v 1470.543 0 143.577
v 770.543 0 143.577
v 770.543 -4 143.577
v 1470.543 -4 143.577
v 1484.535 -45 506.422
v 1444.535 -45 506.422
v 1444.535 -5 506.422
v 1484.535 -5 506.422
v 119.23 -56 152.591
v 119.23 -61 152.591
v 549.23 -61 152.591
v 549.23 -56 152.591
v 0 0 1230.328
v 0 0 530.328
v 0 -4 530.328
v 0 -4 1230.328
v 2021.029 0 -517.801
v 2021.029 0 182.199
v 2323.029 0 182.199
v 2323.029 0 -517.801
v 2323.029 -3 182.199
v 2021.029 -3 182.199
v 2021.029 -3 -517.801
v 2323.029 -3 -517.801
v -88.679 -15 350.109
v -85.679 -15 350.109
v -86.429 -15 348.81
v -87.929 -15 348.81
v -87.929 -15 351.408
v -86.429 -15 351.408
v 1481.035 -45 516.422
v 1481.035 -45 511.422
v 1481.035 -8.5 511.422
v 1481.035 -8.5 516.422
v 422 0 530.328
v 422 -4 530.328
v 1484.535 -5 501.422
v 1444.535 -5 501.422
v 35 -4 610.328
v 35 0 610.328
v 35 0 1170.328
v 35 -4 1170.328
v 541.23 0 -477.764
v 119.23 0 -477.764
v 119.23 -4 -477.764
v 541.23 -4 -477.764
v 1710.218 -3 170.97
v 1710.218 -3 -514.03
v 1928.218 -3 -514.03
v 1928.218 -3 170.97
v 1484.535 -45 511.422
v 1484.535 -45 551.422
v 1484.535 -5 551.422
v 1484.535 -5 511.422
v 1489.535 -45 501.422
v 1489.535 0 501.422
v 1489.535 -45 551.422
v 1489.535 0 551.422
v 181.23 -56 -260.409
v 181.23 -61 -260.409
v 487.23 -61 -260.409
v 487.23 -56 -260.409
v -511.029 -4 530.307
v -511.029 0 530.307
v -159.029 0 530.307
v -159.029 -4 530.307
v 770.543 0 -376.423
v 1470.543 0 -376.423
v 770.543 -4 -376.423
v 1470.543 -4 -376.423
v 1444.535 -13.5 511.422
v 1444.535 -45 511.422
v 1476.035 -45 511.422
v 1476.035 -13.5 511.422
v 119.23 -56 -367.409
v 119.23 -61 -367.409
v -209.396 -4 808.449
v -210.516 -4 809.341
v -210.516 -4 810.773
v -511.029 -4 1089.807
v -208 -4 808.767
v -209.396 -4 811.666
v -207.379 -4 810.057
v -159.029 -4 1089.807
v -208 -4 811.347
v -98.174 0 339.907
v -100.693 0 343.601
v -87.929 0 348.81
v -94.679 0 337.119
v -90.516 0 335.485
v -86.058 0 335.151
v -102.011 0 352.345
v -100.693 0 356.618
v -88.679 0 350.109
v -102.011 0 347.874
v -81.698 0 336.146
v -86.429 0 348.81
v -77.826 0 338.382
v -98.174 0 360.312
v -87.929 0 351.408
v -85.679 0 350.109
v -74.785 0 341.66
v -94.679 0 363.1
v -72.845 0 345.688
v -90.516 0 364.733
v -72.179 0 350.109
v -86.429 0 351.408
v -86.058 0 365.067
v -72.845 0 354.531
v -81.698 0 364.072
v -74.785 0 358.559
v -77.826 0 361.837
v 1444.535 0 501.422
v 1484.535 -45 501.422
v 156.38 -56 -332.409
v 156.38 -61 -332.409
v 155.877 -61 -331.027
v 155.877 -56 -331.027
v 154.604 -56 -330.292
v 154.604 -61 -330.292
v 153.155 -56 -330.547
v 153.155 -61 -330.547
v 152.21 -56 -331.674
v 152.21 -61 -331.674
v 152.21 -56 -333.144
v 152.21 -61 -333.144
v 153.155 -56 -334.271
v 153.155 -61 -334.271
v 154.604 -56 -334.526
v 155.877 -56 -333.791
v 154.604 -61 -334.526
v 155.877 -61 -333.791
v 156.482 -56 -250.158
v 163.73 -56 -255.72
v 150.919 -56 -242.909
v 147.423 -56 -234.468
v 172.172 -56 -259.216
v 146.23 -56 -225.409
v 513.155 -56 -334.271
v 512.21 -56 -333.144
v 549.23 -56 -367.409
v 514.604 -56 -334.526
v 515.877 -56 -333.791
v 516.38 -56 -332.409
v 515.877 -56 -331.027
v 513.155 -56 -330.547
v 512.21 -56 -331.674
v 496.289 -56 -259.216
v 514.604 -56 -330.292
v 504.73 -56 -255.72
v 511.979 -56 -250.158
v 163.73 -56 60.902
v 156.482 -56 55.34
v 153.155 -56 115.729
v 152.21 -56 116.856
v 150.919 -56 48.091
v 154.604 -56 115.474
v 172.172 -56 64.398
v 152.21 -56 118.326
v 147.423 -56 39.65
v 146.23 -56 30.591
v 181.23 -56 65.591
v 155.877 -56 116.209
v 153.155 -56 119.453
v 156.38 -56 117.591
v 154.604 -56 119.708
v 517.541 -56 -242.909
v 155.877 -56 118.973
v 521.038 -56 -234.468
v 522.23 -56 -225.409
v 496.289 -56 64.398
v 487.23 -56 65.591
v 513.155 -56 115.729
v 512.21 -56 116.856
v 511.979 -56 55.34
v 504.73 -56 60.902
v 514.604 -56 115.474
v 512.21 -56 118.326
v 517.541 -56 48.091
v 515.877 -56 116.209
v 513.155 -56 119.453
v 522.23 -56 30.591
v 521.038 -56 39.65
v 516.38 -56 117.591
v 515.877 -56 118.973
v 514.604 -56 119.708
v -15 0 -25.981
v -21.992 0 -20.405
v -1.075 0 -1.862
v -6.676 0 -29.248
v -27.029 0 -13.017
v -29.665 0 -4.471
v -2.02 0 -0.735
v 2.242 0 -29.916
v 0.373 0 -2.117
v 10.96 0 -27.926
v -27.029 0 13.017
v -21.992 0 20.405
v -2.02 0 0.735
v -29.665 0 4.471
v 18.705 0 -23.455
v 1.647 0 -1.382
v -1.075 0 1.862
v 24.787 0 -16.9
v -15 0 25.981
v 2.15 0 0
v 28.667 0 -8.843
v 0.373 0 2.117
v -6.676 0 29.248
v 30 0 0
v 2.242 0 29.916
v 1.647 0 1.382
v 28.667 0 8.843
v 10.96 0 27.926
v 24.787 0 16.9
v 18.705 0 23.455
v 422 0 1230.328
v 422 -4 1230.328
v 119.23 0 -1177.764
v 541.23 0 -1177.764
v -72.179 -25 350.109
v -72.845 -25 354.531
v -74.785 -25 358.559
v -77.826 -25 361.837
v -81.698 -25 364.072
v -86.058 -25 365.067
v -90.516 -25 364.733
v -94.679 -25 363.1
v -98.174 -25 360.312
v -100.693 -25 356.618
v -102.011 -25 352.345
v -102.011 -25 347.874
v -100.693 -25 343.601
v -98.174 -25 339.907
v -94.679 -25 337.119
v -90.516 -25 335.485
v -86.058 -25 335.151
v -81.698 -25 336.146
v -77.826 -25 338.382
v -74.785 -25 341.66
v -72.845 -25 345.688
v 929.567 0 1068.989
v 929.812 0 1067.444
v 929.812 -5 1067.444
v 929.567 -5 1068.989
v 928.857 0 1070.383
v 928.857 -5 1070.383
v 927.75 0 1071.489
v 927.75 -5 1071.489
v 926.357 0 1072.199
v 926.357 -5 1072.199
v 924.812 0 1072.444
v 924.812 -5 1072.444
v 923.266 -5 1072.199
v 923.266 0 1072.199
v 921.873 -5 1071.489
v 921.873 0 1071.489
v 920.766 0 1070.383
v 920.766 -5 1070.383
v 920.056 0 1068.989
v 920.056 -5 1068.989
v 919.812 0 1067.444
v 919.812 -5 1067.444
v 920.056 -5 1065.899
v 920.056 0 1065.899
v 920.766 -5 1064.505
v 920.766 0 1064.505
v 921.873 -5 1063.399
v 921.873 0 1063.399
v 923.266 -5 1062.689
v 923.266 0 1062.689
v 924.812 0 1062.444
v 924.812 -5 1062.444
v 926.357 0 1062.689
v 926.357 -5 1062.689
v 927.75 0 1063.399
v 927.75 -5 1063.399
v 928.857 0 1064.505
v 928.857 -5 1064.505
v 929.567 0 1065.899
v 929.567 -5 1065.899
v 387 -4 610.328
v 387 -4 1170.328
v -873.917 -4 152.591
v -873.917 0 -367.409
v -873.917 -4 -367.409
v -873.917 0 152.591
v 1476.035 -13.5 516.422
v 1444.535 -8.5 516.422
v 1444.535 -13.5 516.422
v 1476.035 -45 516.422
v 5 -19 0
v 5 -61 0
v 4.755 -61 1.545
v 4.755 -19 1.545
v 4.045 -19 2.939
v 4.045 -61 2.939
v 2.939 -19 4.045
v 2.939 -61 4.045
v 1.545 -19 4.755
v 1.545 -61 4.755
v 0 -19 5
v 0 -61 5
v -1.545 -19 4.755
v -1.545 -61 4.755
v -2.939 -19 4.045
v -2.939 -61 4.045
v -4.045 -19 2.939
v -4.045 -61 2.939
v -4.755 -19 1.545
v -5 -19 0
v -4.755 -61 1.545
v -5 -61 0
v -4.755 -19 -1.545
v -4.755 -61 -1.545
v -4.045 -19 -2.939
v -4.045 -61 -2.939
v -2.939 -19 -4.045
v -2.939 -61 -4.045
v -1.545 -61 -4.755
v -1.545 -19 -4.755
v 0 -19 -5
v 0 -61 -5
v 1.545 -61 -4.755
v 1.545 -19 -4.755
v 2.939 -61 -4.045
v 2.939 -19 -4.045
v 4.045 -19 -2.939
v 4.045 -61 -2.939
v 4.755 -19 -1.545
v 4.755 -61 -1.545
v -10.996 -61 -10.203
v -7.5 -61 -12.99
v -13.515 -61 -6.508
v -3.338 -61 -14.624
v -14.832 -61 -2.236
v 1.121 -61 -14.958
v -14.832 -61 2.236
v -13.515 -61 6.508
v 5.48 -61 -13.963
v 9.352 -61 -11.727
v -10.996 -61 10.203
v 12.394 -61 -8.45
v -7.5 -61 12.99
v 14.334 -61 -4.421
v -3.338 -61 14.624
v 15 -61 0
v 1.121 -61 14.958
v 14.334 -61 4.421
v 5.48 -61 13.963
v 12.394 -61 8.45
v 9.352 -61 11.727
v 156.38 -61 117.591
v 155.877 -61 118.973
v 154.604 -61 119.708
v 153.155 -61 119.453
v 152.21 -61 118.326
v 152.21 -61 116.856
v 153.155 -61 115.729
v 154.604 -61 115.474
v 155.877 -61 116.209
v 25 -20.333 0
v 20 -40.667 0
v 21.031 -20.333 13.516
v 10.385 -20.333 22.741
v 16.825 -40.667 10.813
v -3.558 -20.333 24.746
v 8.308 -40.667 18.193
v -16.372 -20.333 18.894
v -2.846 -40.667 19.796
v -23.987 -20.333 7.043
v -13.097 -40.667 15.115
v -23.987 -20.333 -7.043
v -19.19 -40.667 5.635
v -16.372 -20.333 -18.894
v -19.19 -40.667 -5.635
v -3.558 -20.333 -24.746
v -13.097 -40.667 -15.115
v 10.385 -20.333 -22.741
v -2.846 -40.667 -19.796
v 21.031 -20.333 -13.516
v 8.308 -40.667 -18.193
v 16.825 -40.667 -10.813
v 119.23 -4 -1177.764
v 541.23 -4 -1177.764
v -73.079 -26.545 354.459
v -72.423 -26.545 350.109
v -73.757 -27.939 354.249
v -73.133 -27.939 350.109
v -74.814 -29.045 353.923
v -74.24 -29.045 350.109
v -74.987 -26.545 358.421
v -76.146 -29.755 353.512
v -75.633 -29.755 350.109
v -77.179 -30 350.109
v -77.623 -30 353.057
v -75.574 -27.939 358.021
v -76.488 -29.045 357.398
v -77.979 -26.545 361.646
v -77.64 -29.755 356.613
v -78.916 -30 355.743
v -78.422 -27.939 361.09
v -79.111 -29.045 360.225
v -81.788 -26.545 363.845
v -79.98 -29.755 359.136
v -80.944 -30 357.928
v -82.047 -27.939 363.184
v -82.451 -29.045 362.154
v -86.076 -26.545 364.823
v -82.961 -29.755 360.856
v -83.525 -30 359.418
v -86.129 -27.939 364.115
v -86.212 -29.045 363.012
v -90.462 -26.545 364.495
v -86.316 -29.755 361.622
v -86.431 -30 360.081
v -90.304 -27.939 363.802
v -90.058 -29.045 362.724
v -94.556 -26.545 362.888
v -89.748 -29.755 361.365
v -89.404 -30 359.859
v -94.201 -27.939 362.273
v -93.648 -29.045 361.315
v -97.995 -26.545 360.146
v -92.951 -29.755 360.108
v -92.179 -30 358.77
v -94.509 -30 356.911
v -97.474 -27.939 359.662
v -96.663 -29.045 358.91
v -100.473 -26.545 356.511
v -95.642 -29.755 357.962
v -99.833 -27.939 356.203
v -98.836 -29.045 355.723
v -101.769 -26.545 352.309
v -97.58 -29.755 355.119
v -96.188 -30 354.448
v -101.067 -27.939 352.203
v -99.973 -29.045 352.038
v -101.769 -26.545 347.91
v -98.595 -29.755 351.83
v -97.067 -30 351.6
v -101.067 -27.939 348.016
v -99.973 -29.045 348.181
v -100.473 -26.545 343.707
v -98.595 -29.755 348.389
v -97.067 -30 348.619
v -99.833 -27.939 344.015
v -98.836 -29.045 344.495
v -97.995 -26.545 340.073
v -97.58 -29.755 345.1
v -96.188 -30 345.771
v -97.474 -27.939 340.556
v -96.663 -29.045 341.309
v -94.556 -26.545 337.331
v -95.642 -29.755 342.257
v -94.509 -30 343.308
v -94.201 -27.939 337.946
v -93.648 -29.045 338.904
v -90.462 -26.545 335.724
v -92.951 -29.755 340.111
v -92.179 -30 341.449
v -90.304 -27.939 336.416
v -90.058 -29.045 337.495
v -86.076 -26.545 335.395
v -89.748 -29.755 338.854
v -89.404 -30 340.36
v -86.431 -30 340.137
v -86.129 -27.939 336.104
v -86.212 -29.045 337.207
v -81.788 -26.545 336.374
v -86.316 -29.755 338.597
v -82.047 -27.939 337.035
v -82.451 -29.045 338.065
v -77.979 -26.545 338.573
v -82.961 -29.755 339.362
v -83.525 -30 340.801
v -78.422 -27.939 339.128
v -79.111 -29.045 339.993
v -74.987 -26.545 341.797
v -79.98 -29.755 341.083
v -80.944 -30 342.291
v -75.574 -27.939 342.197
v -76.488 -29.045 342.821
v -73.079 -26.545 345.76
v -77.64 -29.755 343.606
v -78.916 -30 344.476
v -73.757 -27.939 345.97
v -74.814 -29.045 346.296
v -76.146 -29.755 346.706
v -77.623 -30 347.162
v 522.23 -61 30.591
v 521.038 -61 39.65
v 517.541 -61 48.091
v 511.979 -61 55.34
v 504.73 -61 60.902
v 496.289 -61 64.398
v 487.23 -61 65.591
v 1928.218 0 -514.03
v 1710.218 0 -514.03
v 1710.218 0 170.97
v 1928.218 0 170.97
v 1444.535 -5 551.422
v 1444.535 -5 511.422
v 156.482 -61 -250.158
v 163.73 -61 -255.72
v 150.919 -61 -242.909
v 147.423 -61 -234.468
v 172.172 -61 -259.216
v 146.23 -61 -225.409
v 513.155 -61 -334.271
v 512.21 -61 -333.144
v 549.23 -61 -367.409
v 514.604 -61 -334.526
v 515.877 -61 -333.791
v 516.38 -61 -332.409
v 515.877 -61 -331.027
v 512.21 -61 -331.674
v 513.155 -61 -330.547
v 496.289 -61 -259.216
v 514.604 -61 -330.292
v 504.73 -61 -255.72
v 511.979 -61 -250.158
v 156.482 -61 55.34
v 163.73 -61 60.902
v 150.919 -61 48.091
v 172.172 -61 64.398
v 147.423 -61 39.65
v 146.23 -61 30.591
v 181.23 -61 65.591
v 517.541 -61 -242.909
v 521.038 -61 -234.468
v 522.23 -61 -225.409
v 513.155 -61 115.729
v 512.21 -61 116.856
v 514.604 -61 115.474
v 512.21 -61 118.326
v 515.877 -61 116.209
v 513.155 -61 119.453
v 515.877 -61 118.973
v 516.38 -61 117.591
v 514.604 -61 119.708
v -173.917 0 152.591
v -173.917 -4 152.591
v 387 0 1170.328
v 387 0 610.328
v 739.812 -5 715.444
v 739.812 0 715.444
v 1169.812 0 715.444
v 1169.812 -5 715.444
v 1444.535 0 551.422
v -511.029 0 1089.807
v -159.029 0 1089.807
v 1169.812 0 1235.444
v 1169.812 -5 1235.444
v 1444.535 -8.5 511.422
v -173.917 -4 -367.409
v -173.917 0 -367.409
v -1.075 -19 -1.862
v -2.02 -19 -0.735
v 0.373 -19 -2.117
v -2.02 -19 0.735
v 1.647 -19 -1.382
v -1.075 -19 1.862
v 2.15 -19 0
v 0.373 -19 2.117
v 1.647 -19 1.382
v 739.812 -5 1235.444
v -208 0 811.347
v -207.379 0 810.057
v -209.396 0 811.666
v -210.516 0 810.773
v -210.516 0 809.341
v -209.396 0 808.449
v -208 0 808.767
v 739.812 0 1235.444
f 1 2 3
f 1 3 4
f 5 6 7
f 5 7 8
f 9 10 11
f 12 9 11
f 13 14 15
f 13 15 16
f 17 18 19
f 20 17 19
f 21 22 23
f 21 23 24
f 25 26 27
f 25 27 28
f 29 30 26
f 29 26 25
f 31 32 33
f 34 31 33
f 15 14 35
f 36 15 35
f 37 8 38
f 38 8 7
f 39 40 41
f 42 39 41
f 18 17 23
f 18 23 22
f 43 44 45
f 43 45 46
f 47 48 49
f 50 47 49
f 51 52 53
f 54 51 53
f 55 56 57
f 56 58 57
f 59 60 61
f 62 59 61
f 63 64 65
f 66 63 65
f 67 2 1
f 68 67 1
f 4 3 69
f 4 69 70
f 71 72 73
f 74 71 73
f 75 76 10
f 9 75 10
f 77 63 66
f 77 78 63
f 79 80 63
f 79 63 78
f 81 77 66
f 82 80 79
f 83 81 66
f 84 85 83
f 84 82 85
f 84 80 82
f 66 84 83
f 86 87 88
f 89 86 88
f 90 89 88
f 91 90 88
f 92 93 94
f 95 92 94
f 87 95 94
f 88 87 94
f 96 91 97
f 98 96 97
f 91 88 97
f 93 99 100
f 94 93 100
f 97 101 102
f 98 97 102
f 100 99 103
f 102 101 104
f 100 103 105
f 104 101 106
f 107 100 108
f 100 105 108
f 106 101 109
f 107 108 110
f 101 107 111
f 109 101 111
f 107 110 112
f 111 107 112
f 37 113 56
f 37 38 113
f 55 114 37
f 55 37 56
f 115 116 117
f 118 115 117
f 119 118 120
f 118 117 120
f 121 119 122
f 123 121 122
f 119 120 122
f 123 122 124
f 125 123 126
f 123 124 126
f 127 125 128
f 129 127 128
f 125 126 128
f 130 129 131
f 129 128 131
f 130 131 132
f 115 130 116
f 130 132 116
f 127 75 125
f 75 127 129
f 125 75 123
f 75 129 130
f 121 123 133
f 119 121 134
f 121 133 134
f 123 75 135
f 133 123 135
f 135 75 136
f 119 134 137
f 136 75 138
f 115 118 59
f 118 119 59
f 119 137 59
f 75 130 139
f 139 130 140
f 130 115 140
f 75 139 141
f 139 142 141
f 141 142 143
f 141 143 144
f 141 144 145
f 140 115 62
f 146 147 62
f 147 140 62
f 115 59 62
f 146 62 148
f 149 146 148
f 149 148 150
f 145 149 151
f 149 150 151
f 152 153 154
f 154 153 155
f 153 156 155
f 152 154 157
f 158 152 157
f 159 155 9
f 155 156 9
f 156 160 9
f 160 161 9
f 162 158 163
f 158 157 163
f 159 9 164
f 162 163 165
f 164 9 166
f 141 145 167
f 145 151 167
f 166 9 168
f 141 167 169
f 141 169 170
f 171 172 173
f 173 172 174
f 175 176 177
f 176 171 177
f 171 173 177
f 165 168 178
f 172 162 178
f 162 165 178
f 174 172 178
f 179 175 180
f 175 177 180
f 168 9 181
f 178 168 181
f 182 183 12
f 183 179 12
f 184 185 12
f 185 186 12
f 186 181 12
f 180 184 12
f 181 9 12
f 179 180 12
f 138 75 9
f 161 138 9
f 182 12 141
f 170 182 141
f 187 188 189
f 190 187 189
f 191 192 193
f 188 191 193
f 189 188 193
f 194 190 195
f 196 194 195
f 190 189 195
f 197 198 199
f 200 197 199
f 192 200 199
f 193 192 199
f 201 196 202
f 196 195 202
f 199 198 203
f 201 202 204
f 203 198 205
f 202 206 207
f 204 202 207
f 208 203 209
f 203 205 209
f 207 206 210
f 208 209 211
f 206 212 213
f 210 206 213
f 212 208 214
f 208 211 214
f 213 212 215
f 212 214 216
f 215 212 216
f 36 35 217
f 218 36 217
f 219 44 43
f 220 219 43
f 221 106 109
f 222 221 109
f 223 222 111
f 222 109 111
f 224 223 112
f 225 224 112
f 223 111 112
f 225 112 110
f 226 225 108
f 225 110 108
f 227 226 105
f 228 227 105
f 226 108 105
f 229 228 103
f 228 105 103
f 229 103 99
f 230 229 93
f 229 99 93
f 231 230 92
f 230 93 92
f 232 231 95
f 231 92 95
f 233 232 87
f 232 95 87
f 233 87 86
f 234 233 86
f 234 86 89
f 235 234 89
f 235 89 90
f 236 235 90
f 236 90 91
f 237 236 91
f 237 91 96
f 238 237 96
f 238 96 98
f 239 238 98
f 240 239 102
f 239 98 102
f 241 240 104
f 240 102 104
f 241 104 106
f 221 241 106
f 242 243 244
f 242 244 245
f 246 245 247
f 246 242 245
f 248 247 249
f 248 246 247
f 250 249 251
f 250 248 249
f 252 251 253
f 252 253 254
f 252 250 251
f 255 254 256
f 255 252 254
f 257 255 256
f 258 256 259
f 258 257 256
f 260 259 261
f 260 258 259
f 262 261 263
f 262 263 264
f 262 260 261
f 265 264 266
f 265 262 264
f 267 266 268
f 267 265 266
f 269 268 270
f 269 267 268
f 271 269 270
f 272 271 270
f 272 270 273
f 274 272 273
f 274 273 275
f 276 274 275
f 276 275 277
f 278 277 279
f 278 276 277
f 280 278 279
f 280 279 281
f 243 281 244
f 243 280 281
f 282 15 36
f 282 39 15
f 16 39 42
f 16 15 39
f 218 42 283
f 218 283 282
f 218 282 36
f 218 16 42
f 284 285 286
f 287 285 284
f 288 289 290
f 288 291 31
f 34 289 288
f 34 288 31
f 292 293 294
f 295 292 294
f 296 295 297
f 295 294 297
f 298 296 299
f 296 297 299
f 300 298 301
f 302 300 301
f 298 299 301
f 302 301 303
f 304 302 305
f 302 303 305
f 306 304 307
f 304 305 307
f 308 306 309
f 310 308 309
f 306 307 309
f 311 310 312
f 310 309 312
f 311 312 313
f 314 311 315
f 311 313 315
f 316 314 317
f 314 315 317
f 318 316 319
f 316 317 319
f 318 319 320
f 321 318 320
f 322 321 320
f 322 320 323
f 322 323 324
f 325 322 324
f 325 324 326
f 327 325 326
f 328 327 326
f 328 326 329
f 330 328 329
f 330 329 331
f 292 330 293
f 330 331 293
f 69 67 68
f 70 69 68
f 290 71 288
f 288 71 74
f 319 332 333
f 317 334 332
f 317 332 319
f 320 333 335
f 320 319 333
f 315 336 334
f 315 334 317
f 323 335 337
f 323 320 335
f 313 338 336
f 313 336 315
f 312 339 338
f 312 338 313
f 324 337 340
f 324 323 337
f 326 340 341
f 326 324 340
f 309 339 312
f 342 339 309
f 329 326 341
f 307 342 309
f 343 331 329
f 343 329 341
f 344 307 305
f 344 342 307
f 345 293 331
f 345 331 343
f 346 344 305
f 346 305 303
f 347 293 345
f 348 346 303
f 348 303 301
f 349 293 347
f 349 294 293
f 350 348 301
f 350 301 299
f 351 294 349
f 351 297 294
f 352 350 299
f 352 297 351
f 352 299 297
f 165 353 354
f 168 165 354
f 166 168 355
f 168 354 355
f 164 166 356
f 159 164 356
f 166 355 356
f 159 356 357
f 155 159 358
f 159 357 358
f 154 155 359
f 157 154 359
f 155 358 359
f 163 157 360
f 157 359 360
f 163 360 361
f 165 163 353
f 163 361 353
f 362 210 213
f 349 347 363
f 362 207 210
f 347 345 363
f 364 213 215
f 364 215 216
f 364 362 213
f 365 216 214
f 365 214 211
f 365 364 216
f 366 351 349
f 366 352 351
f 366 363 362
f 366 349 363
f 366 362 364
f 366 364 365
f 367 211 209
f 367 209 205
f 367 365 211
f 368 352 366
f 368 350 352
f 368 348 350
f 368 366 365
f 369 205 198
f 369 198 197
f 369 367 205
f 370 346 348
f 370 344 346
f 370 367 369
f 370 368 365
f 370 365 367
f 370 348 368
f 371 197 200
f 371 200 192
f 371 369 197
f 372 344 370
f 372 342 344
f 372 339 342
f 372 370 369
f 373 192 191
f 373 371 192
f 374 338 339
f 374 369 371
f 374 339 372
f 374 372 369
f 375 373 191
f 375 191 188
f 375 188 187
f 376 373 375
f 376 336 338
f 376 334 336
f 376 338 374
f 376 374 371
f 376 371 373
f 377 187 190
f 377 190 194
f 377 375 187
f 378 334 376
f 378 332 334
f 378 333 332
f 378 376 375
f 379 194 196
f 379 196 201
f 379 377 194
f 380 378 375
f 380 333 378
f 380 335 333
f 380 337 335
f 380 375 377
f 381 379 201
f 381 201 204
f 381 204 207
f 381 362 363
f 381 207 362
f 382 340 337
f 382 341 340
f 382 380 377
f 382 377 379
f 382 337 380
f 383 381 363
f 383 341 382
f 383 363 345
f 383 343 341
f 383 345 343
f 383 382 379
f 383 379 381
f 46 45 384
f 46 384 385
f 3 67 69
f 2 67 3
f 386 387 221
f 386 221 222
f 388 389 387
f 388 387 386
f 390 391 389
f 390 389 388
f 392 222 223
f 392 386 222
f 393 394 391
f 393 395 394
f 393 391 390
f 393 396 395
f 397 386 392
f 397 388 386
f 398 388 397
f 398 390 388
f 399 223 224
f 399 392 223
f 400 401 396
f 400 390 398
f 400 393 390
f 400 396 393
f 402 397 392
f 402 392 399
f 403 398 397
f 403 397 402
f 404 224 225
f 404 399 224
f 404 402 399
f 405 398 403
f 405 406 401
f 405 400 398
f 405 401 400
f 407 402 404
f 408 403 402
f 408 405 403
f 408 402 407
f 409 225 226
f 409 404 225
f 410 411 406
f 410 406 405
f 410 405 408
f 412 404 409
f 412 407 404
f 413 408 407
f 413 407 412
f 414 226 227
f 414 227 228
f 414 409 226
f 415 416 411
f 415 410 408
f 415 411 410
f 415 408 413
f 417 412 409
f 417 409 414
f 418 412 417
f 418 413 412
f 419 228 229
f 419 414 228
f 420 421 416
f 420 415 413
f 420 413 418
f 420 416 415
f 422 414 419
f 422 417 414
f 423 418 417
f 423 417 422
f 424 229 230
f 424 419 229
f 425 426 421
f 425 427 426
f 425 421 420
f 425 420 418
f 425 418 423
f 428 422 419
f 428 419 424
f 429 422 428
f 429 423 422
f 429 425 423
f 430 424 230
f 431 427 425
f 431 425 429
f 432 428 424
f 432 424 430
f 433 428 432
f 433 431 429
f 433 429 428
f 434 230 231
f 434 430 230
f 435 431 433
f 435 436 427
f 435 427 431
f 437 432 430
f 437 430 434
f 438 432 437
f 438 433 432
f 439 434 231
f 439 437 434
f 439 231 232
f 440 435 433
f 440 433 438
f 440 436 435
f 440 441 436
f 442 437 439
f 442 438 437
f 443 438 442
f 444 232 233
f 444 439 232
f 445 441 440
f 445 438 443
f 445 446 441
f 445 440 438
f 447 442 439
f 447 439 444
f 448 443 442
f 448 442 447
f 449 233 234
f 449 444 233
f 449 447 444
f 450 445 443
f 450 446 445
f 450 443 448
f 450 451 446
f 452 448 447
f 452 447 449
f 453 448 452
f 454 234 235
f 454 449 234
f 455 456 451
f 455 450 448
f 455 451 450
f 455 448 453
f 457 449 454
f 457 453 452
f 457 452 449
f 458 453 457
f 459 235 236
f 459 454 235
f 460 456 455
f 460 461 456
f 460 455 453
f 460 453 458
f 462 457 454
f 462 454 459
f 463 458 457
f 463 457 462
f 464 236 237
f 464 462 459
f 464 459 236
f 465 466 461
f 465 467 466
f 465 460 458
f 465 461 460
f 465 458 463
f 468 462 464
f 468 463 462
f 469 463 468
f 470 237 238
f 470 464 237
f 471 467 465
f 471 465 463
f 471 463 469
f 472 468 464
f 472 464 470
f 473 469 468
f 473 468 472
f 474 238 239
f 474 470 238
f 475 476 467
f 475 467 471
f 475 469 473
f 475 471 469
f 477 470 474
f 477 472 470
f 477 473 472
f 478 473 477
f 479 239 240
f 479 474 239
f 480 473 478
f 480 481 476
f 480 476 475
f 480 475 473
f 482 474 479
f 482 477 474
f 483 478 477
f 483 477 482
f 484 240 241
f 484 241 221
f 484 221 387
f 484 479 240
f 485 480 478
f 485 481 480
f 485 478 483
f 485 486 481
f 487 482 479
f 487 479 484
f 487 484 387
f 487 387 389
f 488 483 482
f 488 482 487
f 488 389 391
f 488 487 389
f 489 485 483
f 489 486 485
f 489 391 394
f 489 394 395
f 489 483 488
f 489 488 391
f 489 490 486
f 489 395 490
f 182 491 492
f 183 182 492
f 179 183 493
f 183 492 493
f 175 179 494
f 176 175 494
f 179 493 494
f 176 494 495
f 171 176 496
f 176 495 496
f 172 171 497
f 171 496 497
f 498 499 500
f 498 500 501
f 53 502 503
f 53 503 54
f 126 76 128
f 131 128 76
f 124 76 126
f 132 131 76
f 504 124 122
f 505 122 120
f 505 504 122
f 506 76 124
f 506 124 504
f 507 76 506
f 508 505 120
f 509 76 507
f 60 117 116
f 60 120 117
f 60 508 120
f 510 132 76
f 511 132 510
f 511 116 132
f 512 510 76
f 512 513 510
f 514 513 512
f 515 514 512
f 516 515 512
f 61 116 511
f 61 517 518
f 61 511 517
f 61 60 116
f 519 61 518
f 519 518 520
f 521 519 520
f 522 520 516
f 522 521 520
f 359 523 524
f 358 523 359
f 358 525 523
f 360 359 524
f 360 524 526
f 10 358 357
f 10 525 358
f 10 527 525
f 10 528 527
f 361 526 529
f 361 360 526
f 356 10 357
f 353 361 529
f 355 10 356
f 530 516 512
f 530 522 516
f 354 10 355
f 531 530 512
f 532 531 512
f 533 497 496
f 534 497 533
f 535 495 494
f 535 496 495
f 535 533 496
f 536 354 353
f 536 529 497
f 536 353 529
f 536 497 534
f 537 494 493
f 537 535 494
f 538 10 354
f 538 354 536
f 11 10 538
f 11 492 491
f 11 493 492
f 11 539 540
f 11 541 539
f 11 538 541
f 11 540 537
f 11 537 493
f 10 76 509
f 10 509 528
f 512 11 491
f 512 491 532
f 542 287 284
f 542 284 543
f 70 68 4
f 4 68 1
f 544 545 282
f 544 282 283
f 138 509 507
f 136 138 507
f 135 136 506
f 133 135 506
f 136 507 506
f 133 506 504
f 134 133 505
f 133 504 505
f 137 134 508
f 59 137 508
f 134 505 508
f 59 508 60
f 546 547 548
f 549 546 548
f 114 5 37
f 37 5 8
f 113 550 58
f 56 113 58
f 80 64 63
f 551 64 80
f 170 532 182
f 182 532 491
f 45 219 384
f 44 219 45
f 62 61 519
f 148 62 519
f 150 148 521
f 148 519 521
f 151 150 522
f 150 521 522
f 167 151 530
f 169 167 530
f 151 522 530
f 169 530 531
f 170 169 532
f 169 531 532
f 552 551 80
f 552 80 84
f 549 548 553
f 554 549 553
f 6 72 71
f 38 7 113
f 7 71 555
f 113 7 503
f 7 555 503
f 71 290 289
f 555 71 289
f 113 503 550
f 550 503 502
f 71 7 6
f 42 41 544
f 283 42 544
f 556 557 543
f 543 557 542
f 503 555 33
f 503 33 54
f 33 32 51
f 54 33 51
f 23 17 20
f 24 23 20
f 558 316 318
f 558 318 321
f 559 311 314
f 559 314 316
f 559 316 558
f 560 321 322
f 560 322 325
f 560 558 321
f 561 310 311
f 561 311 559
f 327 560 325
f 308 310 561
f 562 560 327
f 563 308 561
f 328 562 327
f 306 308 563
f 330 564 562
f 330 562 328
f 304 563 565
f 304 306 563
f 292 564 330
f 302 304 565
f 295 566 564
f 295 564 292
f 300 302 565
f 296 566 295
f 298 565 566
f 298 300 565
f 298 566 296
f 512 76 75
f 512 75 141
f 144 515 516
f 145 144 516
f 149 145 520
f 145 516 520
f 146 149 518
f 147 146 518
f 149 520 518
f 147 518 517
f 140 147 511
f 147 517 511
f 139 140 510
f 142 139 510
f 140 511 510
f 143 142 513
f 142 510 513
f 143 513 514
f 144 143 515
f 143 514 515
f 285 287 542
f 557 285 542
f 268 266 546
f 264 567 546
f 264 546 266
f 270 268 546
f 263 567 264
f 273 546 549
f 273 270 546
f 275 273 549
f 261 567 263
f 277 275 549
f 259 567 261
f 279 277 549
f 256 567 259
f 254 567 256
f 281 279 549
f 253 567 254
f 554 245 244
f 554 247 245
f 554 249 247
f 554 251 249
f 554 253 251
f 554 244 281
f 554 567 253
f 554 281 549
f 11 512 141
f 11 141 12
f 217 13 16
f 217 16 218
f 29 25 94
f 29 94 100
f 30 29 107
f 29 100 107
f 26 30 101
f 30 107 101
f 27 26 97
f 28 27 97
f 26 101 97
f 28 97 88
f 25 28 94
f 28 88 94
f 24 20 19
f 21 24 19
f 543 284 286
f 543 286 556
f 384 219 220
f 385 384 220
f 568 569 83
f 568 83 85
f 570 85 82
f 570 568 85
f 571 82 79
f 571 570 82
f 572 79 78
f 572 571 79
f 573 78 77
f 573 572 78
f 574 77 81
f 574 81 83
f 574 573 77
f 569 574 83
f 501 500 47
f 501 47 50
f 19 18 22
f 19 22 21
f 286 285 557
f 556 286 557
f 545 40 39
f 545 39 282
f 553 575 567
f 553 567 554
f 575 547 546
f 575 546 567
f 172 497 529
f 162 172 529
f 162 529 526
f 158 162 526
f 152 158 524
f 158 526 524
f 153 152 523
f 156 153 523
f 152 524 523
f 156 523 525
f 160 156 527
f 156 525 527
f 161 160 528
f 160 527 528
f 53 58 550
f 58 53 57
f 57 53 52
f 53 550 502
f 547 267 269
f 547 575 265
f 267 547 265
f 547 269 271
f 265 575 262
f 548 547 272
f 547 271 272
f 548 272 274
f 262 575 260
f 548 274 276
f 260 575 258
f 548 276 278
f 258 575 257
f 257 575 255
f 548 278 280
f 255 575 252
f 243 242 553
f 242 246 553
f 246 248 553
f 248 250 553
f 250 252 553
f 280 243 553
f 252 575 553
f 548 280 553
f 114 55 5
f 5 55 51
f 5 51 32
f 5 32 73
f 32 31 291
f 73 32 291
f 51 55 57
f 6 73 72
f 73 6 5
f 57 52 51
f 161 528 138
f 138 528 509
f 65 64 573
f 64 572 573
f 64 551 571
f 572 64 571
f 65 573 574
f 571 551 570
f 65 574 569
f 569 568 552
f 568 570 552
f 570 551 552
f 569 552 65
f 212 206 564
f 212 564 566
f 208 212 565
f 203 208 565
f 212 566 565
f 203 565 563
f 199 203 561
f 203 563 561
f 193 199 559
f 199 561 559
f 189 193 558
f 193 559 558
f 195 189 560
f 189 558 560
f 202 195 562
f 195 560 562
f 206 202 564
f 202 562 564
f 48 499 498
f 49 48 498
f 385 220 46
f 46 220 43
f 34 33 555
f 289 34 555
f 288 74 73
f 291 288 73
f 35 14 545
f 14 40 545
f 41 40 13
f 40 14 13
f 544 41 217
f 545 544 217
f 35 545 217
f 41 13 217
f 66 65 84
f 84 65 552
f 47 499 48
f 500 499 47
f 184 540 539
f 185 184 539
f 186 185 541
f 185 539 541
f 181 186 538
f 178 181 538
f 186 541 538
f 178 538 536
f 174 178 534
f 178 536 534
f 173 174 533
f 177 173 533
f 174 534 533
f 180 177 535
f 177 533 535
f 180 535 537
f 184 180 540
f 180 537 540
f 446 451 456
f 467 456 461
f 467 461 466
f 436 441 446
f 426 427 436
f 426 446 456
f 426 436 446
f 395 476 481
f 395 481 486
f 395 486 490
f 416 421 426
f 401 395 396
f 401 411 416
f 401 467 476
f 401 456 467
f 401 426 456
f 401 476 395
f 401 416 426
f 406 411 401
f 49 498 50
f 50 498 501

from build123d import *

# Parameters (mm, degrees)
F2_R        = 30
F4_R        = 15
F6_R        = 5
F7_DEPTH    = 42
F8_R        = 2.15
F9_DEPTH    = 19.0010001
F10_W       = 430
F10_H       = 520
F10_R       = 2.15
F11_DEPTH   = 5
F13_DEPTH   = 61.0010001
F14_W       = 700
F14_H       = 520
F16_DEPTH   = 4
F15_W       = 422
F15_H       = 700
F17_DEPTH   = 4
F18_W       = 700
F18_H       = 520
F19_DEPTH   = 4
F20_W       = 422
F20_H       = 700
F20_W_2     = 352
F20_H_2     = 560
F21_DEPTH   = 4
F22_W       = 430
F22_H       = 520
F22_R       = 5
F23_DEPTH   = 5
F24_W       = 352
F24_H       = 559.5
F24_R       = 1.65
F25_DEPTH   = 4
F26_R       = 15
F27_DEPTH   = 30
F28_R       = 5
F29_R       = 1.5
F30_DEPTH   = 15
F31_W       = 40
F31_H       = 40
F32_DEPTH   = 5
F33_W       = 40
F33_H       = 40
F33_W_2     = 5
F34_DEPTH   = 5
F35_W       = 40
F35_H       = 40
F36_DEPTH   = 5
F36_FACE1_W = 40
F36_FACE1_H = 40
F38_DEPTH   = 5
F40_DEPTH   = 5
F41_W       = 302
F41_H       = 700
F42_DEPTH   = 3
F43_W       = 218
F43_H       = 685
F44_DEPTH   = 3


with BuildPart() as f5:
    # F2 (on Front) → F5 section 0
    with BuildSketch(Plane.XZ):
        Circle(F2_R)
    # F4 (on offset) → F5 section 1
    with BuildSketch(Plane.XZ.offset(61)):
        Circle(F4_R)
    loft()

    # F6 (on face) → F7 (cut)
    with BuildSketch(Plane.XZ.offset(61)):
        Circle(F6_R)
    extrude(amount=-F7_DEPTH, mode=Mode.SUBTRACT)

    # F8 (on face) → F9 (cut, through all)
    with BuildSketch(Plane.XZ.offset(19)):
        Circle(F8_R)
    extrude(amount=-F9_DEPTH, mode=Mode.SUBTRACT)


with BuildPart() as f11:
    # F10 (on offset) → F11 (new body)
    with BuildSketch(Plane.XZ.offset(61)):
        with Locations((334.2302817106, -107.4090420464)):
            Rectangle(F10_W, F10_H)
        with Locations((154.2302817106, -332.4090420464)):
            Circle(F10_R, mode=Mode.SUBTRACT)
        with Locations((514.2302817106, -332.4090420464)):
            Circle(F10_R, mode=Mode.SUBTRACT)
        with Locations((154.2302817106, 117.5909579536)):
            Circle(F10_R, mode=Mode.SUBTRACT)
        with Locations((514.2302817106, 117.5909579536)):
            Circle(F10_R, mode=Mode.SUBTRACT)
    extrude(amount=-F11_DEPTH)

    # F12 (on face) → F13 (cut, through all)
    with BuildSketch(Plane.XZ.offset(61)):
        with BuildLine():
            Line((487.2302817106, 65.5909579536), (181.2302817106, 65.5909579536))
            ThreePointArc((181.2302817106, 65.5909579536), (156.4815443691, 55.3396952951), (146.2302817106, 30.5909579536))
            Line((146.2302817106, 30.5909579536), (146.2302817106, -225.4090420464))
            ThreePointArc((146.2302817106, -225.4090420464), (156.4815443691, -250.1577793879), (181.2302817106, -260.4090420464))
            Line((181.2302817106, -260.4090420464), (487.2302817106, -260.4090420464))
            ThreePointArc((487.2302817106, -260.4090420464), (511.9790190522, -250.1577793879), (522.2302817106, -225.4090420464))
            Line((522.2302817106, -225.4090420464), (522.2302817106, 30.5909579536))
            ThreePointArc((522.2302817106, 30.5909579536), (511.9790190522, 55.3396952951), (487.2302817106, 65.5909579536))
        make_face()
    extrude(amount=-F13_DEPTH, mode=Mode.SUBTRACT)


with BuildPart() as f16:
    # F14 (on Front) → F16 (new body)
    with BuildSketch(Plane.XZ):
        with Locations((-523.9171147346, -107.4090420464)):
            Rectangle(F14_W, F14_H)
    extrude(amount=F16_DEPTH)


with BuildPart() as f17:
    # F15 (on Front) → F17 (new body)
    with BuildSketch(Plane.XZ):
        with Locations((330.2302817106, -827.7637004852)):
            Rectangle(F15_W, F15_H)
    extrude(amount=F17_DEPTH)


with BuildPart() as f19:
    # F18 (on Front) → F19 (new body)
    with BuildSketch(Plane.XZ):
        with Locations((1120.5426770376, -116.4230778813)):
            Rectangle(F18_W, F18_H)
    extrude(amount=F19_DEPTH)


with BuildPart() as f21:
    # F20 (on Front) → F21 (new body)
    with BuildSketch(Plane.XZ):
        with Locations((211, 880.3275906977)):
            Rectangle(F20_W, F20_H)
        with Locations((211, 890.3275906977)):
            Rectangle(F20_W_2, F20_H_2, mode=Mode.SUBTRACT)
    extrude(amount=F21_DEPTH)


with BuildPart() as f23:
    # F22 (on Front) → F23 (new body)
    with BuildSketch(Plane.XZ):
        with Locations((954.81153965, 975.4439687729)):
            Rectangle(F22_W, F22_H)
        with Locations((924.81153965, 1067.4439687729)):
            Circle(F22_R, mode=Mode.SUBTRACT)
    extrude(amount=F23_DEPTH)


with BuildPart() as f25:
    # F24 (on Front) → F25 (new body)
    with BuildSketch(Plane.XZ):
        with Locations((-335.0291686491, 810.057264328)):
            Rectangle(F24_W, F24_H)
        with Locations((-209.0291686491, 810.057264328)):
            Circle(F24_R, mode=Mode.SUBTRACT)
    extrude(amount=F25_DEPTH)


with BuildPart() as f27:
    # F26 (on Front) → F27 (new body)
    with BuildSketch(Plane.XZ):
        with Locations((-87.1785804629, 350.1093685627)):
            Circle(F26_R)
    extrude(amount=F27_DEPTH)

    # F28
    f28_edges = [f27.edges().sort_by_distance(p)[0] for p in [
        (-102.17858, -30, 350.109369),
    ]]
    fillet(f28_edges, radius=F28_R)

    # F29 (on face) → F30 (cut)
    with BuildSketch(Plane(origin=(0, 0, 0), x_dir=(-1, 0, 0), z_dir=(0, 1, 0))):
        with Locations((87.1785804629, 350.1093685627)):
            Circle(F29_R)
    extrude(amount=-F30_DEPTH, mode=Mode.SUBTRACT)


with BuildPart() as f32:
    # F31 (on Front) → F32 (new body)
    with BuildSketch(Plane.XZ):
        with Locations((1464.5347595215, 531.4224843595)):
            Rectangle(F31_W, F31_H)
    extrude(amount=F32_DEPTH)

    # F33 (on face) → F34 (join)
    with BuildSketch(Plane.YZ.offset(1484.5347595215)):
        with Locations((-25, 531.4224843595)):
            Rectangle(F33_W, F33_H)
        with Locations((-2.5, 531.4224843595)):
            Rectangle(F33_W_2, F33_H)
    extrude(amount=F34_DEPTH)

    # F35 (on face) → F36 (join)
    with BuildSketch(Plane(origin=(0, 0, 511.4224843595), x_dir=(1, 0, 0), z_dir=(0, 0, -1))):
        Polygon((1444.5347595215, 0), (1489.5347595215, 0), (1489.5347595215, 45), (1484.5347595215, 45), (1484.5347595215, 5), (1444.5347595215, 5), align=None)
        with Locations((1464.5347595215, 25)):
            Rectangle(F35_W, F35_H)
    extrude(amount=F36_DEPTH)

    # F37 (on face) + F36_face1 (on face) → F38 (join)
    with BuildSketch(Plane(origin=(0, 0, 506.4224843595), x_dir=(1, 0, 0), z_dir=(0, 0, -1))):
        Polygon((1444.5347595215, 0), (1489.5347595215, 0), (1489.5347595215, 45), (1484.5347595215, 45), (1484.5347595215, 5), (1444.5347595215, 5), align=None)
    with BuildSketch(Plane(origin=(1464.5347595215, -25, 511.4224843595), x_dir=(1, 0, 0), z_dir=(0, 0, 1))):
        Rectangle(F36_FACE1_W, F36_FACE1_H)
    extrude(amount=F38_DEPTH, dir=(0, 0, -1))

    # F39 (on face) → F40 (join)
    with BuildSketch(Plane.XY.offset(511.4224843595)):
        Polygon((1481.0347595215, -8.5), (1444.5347595215, -8.5), (1444.5347595215, -13.5), (1476.0347595215, -13.5), (1476.0347595215, -45), (1481.0347595215, -45), align=None)
    extrude(amount=F40_DEPTH)


with BuildPart() as f42:
    # F41 (on Front) → F42 (new body)
    with BuildSketch(Plane.XZ):
        with Locations((2172.0292568207, -167.8005013911)):
            Rectangle(F41_W, F41_H)
    extrude(amount=F42_DEPTH)


with BuildPart() as f44:
    # F43 (on Front) → F44 (new body)
    with BuildSketch(Plane.XZ):
        with Locations((1819.2178010941, -171.5295280986)):
            Rectangle(F43_W, F43_H)
    extrude(amount=F44_DEPTH)


solid = Compound([f5.part, f11.part, f16.part, f17.part, f19.part, f21.part, f23.part, f25.part, f27.part, f32.part, f42.part, f44.part])
